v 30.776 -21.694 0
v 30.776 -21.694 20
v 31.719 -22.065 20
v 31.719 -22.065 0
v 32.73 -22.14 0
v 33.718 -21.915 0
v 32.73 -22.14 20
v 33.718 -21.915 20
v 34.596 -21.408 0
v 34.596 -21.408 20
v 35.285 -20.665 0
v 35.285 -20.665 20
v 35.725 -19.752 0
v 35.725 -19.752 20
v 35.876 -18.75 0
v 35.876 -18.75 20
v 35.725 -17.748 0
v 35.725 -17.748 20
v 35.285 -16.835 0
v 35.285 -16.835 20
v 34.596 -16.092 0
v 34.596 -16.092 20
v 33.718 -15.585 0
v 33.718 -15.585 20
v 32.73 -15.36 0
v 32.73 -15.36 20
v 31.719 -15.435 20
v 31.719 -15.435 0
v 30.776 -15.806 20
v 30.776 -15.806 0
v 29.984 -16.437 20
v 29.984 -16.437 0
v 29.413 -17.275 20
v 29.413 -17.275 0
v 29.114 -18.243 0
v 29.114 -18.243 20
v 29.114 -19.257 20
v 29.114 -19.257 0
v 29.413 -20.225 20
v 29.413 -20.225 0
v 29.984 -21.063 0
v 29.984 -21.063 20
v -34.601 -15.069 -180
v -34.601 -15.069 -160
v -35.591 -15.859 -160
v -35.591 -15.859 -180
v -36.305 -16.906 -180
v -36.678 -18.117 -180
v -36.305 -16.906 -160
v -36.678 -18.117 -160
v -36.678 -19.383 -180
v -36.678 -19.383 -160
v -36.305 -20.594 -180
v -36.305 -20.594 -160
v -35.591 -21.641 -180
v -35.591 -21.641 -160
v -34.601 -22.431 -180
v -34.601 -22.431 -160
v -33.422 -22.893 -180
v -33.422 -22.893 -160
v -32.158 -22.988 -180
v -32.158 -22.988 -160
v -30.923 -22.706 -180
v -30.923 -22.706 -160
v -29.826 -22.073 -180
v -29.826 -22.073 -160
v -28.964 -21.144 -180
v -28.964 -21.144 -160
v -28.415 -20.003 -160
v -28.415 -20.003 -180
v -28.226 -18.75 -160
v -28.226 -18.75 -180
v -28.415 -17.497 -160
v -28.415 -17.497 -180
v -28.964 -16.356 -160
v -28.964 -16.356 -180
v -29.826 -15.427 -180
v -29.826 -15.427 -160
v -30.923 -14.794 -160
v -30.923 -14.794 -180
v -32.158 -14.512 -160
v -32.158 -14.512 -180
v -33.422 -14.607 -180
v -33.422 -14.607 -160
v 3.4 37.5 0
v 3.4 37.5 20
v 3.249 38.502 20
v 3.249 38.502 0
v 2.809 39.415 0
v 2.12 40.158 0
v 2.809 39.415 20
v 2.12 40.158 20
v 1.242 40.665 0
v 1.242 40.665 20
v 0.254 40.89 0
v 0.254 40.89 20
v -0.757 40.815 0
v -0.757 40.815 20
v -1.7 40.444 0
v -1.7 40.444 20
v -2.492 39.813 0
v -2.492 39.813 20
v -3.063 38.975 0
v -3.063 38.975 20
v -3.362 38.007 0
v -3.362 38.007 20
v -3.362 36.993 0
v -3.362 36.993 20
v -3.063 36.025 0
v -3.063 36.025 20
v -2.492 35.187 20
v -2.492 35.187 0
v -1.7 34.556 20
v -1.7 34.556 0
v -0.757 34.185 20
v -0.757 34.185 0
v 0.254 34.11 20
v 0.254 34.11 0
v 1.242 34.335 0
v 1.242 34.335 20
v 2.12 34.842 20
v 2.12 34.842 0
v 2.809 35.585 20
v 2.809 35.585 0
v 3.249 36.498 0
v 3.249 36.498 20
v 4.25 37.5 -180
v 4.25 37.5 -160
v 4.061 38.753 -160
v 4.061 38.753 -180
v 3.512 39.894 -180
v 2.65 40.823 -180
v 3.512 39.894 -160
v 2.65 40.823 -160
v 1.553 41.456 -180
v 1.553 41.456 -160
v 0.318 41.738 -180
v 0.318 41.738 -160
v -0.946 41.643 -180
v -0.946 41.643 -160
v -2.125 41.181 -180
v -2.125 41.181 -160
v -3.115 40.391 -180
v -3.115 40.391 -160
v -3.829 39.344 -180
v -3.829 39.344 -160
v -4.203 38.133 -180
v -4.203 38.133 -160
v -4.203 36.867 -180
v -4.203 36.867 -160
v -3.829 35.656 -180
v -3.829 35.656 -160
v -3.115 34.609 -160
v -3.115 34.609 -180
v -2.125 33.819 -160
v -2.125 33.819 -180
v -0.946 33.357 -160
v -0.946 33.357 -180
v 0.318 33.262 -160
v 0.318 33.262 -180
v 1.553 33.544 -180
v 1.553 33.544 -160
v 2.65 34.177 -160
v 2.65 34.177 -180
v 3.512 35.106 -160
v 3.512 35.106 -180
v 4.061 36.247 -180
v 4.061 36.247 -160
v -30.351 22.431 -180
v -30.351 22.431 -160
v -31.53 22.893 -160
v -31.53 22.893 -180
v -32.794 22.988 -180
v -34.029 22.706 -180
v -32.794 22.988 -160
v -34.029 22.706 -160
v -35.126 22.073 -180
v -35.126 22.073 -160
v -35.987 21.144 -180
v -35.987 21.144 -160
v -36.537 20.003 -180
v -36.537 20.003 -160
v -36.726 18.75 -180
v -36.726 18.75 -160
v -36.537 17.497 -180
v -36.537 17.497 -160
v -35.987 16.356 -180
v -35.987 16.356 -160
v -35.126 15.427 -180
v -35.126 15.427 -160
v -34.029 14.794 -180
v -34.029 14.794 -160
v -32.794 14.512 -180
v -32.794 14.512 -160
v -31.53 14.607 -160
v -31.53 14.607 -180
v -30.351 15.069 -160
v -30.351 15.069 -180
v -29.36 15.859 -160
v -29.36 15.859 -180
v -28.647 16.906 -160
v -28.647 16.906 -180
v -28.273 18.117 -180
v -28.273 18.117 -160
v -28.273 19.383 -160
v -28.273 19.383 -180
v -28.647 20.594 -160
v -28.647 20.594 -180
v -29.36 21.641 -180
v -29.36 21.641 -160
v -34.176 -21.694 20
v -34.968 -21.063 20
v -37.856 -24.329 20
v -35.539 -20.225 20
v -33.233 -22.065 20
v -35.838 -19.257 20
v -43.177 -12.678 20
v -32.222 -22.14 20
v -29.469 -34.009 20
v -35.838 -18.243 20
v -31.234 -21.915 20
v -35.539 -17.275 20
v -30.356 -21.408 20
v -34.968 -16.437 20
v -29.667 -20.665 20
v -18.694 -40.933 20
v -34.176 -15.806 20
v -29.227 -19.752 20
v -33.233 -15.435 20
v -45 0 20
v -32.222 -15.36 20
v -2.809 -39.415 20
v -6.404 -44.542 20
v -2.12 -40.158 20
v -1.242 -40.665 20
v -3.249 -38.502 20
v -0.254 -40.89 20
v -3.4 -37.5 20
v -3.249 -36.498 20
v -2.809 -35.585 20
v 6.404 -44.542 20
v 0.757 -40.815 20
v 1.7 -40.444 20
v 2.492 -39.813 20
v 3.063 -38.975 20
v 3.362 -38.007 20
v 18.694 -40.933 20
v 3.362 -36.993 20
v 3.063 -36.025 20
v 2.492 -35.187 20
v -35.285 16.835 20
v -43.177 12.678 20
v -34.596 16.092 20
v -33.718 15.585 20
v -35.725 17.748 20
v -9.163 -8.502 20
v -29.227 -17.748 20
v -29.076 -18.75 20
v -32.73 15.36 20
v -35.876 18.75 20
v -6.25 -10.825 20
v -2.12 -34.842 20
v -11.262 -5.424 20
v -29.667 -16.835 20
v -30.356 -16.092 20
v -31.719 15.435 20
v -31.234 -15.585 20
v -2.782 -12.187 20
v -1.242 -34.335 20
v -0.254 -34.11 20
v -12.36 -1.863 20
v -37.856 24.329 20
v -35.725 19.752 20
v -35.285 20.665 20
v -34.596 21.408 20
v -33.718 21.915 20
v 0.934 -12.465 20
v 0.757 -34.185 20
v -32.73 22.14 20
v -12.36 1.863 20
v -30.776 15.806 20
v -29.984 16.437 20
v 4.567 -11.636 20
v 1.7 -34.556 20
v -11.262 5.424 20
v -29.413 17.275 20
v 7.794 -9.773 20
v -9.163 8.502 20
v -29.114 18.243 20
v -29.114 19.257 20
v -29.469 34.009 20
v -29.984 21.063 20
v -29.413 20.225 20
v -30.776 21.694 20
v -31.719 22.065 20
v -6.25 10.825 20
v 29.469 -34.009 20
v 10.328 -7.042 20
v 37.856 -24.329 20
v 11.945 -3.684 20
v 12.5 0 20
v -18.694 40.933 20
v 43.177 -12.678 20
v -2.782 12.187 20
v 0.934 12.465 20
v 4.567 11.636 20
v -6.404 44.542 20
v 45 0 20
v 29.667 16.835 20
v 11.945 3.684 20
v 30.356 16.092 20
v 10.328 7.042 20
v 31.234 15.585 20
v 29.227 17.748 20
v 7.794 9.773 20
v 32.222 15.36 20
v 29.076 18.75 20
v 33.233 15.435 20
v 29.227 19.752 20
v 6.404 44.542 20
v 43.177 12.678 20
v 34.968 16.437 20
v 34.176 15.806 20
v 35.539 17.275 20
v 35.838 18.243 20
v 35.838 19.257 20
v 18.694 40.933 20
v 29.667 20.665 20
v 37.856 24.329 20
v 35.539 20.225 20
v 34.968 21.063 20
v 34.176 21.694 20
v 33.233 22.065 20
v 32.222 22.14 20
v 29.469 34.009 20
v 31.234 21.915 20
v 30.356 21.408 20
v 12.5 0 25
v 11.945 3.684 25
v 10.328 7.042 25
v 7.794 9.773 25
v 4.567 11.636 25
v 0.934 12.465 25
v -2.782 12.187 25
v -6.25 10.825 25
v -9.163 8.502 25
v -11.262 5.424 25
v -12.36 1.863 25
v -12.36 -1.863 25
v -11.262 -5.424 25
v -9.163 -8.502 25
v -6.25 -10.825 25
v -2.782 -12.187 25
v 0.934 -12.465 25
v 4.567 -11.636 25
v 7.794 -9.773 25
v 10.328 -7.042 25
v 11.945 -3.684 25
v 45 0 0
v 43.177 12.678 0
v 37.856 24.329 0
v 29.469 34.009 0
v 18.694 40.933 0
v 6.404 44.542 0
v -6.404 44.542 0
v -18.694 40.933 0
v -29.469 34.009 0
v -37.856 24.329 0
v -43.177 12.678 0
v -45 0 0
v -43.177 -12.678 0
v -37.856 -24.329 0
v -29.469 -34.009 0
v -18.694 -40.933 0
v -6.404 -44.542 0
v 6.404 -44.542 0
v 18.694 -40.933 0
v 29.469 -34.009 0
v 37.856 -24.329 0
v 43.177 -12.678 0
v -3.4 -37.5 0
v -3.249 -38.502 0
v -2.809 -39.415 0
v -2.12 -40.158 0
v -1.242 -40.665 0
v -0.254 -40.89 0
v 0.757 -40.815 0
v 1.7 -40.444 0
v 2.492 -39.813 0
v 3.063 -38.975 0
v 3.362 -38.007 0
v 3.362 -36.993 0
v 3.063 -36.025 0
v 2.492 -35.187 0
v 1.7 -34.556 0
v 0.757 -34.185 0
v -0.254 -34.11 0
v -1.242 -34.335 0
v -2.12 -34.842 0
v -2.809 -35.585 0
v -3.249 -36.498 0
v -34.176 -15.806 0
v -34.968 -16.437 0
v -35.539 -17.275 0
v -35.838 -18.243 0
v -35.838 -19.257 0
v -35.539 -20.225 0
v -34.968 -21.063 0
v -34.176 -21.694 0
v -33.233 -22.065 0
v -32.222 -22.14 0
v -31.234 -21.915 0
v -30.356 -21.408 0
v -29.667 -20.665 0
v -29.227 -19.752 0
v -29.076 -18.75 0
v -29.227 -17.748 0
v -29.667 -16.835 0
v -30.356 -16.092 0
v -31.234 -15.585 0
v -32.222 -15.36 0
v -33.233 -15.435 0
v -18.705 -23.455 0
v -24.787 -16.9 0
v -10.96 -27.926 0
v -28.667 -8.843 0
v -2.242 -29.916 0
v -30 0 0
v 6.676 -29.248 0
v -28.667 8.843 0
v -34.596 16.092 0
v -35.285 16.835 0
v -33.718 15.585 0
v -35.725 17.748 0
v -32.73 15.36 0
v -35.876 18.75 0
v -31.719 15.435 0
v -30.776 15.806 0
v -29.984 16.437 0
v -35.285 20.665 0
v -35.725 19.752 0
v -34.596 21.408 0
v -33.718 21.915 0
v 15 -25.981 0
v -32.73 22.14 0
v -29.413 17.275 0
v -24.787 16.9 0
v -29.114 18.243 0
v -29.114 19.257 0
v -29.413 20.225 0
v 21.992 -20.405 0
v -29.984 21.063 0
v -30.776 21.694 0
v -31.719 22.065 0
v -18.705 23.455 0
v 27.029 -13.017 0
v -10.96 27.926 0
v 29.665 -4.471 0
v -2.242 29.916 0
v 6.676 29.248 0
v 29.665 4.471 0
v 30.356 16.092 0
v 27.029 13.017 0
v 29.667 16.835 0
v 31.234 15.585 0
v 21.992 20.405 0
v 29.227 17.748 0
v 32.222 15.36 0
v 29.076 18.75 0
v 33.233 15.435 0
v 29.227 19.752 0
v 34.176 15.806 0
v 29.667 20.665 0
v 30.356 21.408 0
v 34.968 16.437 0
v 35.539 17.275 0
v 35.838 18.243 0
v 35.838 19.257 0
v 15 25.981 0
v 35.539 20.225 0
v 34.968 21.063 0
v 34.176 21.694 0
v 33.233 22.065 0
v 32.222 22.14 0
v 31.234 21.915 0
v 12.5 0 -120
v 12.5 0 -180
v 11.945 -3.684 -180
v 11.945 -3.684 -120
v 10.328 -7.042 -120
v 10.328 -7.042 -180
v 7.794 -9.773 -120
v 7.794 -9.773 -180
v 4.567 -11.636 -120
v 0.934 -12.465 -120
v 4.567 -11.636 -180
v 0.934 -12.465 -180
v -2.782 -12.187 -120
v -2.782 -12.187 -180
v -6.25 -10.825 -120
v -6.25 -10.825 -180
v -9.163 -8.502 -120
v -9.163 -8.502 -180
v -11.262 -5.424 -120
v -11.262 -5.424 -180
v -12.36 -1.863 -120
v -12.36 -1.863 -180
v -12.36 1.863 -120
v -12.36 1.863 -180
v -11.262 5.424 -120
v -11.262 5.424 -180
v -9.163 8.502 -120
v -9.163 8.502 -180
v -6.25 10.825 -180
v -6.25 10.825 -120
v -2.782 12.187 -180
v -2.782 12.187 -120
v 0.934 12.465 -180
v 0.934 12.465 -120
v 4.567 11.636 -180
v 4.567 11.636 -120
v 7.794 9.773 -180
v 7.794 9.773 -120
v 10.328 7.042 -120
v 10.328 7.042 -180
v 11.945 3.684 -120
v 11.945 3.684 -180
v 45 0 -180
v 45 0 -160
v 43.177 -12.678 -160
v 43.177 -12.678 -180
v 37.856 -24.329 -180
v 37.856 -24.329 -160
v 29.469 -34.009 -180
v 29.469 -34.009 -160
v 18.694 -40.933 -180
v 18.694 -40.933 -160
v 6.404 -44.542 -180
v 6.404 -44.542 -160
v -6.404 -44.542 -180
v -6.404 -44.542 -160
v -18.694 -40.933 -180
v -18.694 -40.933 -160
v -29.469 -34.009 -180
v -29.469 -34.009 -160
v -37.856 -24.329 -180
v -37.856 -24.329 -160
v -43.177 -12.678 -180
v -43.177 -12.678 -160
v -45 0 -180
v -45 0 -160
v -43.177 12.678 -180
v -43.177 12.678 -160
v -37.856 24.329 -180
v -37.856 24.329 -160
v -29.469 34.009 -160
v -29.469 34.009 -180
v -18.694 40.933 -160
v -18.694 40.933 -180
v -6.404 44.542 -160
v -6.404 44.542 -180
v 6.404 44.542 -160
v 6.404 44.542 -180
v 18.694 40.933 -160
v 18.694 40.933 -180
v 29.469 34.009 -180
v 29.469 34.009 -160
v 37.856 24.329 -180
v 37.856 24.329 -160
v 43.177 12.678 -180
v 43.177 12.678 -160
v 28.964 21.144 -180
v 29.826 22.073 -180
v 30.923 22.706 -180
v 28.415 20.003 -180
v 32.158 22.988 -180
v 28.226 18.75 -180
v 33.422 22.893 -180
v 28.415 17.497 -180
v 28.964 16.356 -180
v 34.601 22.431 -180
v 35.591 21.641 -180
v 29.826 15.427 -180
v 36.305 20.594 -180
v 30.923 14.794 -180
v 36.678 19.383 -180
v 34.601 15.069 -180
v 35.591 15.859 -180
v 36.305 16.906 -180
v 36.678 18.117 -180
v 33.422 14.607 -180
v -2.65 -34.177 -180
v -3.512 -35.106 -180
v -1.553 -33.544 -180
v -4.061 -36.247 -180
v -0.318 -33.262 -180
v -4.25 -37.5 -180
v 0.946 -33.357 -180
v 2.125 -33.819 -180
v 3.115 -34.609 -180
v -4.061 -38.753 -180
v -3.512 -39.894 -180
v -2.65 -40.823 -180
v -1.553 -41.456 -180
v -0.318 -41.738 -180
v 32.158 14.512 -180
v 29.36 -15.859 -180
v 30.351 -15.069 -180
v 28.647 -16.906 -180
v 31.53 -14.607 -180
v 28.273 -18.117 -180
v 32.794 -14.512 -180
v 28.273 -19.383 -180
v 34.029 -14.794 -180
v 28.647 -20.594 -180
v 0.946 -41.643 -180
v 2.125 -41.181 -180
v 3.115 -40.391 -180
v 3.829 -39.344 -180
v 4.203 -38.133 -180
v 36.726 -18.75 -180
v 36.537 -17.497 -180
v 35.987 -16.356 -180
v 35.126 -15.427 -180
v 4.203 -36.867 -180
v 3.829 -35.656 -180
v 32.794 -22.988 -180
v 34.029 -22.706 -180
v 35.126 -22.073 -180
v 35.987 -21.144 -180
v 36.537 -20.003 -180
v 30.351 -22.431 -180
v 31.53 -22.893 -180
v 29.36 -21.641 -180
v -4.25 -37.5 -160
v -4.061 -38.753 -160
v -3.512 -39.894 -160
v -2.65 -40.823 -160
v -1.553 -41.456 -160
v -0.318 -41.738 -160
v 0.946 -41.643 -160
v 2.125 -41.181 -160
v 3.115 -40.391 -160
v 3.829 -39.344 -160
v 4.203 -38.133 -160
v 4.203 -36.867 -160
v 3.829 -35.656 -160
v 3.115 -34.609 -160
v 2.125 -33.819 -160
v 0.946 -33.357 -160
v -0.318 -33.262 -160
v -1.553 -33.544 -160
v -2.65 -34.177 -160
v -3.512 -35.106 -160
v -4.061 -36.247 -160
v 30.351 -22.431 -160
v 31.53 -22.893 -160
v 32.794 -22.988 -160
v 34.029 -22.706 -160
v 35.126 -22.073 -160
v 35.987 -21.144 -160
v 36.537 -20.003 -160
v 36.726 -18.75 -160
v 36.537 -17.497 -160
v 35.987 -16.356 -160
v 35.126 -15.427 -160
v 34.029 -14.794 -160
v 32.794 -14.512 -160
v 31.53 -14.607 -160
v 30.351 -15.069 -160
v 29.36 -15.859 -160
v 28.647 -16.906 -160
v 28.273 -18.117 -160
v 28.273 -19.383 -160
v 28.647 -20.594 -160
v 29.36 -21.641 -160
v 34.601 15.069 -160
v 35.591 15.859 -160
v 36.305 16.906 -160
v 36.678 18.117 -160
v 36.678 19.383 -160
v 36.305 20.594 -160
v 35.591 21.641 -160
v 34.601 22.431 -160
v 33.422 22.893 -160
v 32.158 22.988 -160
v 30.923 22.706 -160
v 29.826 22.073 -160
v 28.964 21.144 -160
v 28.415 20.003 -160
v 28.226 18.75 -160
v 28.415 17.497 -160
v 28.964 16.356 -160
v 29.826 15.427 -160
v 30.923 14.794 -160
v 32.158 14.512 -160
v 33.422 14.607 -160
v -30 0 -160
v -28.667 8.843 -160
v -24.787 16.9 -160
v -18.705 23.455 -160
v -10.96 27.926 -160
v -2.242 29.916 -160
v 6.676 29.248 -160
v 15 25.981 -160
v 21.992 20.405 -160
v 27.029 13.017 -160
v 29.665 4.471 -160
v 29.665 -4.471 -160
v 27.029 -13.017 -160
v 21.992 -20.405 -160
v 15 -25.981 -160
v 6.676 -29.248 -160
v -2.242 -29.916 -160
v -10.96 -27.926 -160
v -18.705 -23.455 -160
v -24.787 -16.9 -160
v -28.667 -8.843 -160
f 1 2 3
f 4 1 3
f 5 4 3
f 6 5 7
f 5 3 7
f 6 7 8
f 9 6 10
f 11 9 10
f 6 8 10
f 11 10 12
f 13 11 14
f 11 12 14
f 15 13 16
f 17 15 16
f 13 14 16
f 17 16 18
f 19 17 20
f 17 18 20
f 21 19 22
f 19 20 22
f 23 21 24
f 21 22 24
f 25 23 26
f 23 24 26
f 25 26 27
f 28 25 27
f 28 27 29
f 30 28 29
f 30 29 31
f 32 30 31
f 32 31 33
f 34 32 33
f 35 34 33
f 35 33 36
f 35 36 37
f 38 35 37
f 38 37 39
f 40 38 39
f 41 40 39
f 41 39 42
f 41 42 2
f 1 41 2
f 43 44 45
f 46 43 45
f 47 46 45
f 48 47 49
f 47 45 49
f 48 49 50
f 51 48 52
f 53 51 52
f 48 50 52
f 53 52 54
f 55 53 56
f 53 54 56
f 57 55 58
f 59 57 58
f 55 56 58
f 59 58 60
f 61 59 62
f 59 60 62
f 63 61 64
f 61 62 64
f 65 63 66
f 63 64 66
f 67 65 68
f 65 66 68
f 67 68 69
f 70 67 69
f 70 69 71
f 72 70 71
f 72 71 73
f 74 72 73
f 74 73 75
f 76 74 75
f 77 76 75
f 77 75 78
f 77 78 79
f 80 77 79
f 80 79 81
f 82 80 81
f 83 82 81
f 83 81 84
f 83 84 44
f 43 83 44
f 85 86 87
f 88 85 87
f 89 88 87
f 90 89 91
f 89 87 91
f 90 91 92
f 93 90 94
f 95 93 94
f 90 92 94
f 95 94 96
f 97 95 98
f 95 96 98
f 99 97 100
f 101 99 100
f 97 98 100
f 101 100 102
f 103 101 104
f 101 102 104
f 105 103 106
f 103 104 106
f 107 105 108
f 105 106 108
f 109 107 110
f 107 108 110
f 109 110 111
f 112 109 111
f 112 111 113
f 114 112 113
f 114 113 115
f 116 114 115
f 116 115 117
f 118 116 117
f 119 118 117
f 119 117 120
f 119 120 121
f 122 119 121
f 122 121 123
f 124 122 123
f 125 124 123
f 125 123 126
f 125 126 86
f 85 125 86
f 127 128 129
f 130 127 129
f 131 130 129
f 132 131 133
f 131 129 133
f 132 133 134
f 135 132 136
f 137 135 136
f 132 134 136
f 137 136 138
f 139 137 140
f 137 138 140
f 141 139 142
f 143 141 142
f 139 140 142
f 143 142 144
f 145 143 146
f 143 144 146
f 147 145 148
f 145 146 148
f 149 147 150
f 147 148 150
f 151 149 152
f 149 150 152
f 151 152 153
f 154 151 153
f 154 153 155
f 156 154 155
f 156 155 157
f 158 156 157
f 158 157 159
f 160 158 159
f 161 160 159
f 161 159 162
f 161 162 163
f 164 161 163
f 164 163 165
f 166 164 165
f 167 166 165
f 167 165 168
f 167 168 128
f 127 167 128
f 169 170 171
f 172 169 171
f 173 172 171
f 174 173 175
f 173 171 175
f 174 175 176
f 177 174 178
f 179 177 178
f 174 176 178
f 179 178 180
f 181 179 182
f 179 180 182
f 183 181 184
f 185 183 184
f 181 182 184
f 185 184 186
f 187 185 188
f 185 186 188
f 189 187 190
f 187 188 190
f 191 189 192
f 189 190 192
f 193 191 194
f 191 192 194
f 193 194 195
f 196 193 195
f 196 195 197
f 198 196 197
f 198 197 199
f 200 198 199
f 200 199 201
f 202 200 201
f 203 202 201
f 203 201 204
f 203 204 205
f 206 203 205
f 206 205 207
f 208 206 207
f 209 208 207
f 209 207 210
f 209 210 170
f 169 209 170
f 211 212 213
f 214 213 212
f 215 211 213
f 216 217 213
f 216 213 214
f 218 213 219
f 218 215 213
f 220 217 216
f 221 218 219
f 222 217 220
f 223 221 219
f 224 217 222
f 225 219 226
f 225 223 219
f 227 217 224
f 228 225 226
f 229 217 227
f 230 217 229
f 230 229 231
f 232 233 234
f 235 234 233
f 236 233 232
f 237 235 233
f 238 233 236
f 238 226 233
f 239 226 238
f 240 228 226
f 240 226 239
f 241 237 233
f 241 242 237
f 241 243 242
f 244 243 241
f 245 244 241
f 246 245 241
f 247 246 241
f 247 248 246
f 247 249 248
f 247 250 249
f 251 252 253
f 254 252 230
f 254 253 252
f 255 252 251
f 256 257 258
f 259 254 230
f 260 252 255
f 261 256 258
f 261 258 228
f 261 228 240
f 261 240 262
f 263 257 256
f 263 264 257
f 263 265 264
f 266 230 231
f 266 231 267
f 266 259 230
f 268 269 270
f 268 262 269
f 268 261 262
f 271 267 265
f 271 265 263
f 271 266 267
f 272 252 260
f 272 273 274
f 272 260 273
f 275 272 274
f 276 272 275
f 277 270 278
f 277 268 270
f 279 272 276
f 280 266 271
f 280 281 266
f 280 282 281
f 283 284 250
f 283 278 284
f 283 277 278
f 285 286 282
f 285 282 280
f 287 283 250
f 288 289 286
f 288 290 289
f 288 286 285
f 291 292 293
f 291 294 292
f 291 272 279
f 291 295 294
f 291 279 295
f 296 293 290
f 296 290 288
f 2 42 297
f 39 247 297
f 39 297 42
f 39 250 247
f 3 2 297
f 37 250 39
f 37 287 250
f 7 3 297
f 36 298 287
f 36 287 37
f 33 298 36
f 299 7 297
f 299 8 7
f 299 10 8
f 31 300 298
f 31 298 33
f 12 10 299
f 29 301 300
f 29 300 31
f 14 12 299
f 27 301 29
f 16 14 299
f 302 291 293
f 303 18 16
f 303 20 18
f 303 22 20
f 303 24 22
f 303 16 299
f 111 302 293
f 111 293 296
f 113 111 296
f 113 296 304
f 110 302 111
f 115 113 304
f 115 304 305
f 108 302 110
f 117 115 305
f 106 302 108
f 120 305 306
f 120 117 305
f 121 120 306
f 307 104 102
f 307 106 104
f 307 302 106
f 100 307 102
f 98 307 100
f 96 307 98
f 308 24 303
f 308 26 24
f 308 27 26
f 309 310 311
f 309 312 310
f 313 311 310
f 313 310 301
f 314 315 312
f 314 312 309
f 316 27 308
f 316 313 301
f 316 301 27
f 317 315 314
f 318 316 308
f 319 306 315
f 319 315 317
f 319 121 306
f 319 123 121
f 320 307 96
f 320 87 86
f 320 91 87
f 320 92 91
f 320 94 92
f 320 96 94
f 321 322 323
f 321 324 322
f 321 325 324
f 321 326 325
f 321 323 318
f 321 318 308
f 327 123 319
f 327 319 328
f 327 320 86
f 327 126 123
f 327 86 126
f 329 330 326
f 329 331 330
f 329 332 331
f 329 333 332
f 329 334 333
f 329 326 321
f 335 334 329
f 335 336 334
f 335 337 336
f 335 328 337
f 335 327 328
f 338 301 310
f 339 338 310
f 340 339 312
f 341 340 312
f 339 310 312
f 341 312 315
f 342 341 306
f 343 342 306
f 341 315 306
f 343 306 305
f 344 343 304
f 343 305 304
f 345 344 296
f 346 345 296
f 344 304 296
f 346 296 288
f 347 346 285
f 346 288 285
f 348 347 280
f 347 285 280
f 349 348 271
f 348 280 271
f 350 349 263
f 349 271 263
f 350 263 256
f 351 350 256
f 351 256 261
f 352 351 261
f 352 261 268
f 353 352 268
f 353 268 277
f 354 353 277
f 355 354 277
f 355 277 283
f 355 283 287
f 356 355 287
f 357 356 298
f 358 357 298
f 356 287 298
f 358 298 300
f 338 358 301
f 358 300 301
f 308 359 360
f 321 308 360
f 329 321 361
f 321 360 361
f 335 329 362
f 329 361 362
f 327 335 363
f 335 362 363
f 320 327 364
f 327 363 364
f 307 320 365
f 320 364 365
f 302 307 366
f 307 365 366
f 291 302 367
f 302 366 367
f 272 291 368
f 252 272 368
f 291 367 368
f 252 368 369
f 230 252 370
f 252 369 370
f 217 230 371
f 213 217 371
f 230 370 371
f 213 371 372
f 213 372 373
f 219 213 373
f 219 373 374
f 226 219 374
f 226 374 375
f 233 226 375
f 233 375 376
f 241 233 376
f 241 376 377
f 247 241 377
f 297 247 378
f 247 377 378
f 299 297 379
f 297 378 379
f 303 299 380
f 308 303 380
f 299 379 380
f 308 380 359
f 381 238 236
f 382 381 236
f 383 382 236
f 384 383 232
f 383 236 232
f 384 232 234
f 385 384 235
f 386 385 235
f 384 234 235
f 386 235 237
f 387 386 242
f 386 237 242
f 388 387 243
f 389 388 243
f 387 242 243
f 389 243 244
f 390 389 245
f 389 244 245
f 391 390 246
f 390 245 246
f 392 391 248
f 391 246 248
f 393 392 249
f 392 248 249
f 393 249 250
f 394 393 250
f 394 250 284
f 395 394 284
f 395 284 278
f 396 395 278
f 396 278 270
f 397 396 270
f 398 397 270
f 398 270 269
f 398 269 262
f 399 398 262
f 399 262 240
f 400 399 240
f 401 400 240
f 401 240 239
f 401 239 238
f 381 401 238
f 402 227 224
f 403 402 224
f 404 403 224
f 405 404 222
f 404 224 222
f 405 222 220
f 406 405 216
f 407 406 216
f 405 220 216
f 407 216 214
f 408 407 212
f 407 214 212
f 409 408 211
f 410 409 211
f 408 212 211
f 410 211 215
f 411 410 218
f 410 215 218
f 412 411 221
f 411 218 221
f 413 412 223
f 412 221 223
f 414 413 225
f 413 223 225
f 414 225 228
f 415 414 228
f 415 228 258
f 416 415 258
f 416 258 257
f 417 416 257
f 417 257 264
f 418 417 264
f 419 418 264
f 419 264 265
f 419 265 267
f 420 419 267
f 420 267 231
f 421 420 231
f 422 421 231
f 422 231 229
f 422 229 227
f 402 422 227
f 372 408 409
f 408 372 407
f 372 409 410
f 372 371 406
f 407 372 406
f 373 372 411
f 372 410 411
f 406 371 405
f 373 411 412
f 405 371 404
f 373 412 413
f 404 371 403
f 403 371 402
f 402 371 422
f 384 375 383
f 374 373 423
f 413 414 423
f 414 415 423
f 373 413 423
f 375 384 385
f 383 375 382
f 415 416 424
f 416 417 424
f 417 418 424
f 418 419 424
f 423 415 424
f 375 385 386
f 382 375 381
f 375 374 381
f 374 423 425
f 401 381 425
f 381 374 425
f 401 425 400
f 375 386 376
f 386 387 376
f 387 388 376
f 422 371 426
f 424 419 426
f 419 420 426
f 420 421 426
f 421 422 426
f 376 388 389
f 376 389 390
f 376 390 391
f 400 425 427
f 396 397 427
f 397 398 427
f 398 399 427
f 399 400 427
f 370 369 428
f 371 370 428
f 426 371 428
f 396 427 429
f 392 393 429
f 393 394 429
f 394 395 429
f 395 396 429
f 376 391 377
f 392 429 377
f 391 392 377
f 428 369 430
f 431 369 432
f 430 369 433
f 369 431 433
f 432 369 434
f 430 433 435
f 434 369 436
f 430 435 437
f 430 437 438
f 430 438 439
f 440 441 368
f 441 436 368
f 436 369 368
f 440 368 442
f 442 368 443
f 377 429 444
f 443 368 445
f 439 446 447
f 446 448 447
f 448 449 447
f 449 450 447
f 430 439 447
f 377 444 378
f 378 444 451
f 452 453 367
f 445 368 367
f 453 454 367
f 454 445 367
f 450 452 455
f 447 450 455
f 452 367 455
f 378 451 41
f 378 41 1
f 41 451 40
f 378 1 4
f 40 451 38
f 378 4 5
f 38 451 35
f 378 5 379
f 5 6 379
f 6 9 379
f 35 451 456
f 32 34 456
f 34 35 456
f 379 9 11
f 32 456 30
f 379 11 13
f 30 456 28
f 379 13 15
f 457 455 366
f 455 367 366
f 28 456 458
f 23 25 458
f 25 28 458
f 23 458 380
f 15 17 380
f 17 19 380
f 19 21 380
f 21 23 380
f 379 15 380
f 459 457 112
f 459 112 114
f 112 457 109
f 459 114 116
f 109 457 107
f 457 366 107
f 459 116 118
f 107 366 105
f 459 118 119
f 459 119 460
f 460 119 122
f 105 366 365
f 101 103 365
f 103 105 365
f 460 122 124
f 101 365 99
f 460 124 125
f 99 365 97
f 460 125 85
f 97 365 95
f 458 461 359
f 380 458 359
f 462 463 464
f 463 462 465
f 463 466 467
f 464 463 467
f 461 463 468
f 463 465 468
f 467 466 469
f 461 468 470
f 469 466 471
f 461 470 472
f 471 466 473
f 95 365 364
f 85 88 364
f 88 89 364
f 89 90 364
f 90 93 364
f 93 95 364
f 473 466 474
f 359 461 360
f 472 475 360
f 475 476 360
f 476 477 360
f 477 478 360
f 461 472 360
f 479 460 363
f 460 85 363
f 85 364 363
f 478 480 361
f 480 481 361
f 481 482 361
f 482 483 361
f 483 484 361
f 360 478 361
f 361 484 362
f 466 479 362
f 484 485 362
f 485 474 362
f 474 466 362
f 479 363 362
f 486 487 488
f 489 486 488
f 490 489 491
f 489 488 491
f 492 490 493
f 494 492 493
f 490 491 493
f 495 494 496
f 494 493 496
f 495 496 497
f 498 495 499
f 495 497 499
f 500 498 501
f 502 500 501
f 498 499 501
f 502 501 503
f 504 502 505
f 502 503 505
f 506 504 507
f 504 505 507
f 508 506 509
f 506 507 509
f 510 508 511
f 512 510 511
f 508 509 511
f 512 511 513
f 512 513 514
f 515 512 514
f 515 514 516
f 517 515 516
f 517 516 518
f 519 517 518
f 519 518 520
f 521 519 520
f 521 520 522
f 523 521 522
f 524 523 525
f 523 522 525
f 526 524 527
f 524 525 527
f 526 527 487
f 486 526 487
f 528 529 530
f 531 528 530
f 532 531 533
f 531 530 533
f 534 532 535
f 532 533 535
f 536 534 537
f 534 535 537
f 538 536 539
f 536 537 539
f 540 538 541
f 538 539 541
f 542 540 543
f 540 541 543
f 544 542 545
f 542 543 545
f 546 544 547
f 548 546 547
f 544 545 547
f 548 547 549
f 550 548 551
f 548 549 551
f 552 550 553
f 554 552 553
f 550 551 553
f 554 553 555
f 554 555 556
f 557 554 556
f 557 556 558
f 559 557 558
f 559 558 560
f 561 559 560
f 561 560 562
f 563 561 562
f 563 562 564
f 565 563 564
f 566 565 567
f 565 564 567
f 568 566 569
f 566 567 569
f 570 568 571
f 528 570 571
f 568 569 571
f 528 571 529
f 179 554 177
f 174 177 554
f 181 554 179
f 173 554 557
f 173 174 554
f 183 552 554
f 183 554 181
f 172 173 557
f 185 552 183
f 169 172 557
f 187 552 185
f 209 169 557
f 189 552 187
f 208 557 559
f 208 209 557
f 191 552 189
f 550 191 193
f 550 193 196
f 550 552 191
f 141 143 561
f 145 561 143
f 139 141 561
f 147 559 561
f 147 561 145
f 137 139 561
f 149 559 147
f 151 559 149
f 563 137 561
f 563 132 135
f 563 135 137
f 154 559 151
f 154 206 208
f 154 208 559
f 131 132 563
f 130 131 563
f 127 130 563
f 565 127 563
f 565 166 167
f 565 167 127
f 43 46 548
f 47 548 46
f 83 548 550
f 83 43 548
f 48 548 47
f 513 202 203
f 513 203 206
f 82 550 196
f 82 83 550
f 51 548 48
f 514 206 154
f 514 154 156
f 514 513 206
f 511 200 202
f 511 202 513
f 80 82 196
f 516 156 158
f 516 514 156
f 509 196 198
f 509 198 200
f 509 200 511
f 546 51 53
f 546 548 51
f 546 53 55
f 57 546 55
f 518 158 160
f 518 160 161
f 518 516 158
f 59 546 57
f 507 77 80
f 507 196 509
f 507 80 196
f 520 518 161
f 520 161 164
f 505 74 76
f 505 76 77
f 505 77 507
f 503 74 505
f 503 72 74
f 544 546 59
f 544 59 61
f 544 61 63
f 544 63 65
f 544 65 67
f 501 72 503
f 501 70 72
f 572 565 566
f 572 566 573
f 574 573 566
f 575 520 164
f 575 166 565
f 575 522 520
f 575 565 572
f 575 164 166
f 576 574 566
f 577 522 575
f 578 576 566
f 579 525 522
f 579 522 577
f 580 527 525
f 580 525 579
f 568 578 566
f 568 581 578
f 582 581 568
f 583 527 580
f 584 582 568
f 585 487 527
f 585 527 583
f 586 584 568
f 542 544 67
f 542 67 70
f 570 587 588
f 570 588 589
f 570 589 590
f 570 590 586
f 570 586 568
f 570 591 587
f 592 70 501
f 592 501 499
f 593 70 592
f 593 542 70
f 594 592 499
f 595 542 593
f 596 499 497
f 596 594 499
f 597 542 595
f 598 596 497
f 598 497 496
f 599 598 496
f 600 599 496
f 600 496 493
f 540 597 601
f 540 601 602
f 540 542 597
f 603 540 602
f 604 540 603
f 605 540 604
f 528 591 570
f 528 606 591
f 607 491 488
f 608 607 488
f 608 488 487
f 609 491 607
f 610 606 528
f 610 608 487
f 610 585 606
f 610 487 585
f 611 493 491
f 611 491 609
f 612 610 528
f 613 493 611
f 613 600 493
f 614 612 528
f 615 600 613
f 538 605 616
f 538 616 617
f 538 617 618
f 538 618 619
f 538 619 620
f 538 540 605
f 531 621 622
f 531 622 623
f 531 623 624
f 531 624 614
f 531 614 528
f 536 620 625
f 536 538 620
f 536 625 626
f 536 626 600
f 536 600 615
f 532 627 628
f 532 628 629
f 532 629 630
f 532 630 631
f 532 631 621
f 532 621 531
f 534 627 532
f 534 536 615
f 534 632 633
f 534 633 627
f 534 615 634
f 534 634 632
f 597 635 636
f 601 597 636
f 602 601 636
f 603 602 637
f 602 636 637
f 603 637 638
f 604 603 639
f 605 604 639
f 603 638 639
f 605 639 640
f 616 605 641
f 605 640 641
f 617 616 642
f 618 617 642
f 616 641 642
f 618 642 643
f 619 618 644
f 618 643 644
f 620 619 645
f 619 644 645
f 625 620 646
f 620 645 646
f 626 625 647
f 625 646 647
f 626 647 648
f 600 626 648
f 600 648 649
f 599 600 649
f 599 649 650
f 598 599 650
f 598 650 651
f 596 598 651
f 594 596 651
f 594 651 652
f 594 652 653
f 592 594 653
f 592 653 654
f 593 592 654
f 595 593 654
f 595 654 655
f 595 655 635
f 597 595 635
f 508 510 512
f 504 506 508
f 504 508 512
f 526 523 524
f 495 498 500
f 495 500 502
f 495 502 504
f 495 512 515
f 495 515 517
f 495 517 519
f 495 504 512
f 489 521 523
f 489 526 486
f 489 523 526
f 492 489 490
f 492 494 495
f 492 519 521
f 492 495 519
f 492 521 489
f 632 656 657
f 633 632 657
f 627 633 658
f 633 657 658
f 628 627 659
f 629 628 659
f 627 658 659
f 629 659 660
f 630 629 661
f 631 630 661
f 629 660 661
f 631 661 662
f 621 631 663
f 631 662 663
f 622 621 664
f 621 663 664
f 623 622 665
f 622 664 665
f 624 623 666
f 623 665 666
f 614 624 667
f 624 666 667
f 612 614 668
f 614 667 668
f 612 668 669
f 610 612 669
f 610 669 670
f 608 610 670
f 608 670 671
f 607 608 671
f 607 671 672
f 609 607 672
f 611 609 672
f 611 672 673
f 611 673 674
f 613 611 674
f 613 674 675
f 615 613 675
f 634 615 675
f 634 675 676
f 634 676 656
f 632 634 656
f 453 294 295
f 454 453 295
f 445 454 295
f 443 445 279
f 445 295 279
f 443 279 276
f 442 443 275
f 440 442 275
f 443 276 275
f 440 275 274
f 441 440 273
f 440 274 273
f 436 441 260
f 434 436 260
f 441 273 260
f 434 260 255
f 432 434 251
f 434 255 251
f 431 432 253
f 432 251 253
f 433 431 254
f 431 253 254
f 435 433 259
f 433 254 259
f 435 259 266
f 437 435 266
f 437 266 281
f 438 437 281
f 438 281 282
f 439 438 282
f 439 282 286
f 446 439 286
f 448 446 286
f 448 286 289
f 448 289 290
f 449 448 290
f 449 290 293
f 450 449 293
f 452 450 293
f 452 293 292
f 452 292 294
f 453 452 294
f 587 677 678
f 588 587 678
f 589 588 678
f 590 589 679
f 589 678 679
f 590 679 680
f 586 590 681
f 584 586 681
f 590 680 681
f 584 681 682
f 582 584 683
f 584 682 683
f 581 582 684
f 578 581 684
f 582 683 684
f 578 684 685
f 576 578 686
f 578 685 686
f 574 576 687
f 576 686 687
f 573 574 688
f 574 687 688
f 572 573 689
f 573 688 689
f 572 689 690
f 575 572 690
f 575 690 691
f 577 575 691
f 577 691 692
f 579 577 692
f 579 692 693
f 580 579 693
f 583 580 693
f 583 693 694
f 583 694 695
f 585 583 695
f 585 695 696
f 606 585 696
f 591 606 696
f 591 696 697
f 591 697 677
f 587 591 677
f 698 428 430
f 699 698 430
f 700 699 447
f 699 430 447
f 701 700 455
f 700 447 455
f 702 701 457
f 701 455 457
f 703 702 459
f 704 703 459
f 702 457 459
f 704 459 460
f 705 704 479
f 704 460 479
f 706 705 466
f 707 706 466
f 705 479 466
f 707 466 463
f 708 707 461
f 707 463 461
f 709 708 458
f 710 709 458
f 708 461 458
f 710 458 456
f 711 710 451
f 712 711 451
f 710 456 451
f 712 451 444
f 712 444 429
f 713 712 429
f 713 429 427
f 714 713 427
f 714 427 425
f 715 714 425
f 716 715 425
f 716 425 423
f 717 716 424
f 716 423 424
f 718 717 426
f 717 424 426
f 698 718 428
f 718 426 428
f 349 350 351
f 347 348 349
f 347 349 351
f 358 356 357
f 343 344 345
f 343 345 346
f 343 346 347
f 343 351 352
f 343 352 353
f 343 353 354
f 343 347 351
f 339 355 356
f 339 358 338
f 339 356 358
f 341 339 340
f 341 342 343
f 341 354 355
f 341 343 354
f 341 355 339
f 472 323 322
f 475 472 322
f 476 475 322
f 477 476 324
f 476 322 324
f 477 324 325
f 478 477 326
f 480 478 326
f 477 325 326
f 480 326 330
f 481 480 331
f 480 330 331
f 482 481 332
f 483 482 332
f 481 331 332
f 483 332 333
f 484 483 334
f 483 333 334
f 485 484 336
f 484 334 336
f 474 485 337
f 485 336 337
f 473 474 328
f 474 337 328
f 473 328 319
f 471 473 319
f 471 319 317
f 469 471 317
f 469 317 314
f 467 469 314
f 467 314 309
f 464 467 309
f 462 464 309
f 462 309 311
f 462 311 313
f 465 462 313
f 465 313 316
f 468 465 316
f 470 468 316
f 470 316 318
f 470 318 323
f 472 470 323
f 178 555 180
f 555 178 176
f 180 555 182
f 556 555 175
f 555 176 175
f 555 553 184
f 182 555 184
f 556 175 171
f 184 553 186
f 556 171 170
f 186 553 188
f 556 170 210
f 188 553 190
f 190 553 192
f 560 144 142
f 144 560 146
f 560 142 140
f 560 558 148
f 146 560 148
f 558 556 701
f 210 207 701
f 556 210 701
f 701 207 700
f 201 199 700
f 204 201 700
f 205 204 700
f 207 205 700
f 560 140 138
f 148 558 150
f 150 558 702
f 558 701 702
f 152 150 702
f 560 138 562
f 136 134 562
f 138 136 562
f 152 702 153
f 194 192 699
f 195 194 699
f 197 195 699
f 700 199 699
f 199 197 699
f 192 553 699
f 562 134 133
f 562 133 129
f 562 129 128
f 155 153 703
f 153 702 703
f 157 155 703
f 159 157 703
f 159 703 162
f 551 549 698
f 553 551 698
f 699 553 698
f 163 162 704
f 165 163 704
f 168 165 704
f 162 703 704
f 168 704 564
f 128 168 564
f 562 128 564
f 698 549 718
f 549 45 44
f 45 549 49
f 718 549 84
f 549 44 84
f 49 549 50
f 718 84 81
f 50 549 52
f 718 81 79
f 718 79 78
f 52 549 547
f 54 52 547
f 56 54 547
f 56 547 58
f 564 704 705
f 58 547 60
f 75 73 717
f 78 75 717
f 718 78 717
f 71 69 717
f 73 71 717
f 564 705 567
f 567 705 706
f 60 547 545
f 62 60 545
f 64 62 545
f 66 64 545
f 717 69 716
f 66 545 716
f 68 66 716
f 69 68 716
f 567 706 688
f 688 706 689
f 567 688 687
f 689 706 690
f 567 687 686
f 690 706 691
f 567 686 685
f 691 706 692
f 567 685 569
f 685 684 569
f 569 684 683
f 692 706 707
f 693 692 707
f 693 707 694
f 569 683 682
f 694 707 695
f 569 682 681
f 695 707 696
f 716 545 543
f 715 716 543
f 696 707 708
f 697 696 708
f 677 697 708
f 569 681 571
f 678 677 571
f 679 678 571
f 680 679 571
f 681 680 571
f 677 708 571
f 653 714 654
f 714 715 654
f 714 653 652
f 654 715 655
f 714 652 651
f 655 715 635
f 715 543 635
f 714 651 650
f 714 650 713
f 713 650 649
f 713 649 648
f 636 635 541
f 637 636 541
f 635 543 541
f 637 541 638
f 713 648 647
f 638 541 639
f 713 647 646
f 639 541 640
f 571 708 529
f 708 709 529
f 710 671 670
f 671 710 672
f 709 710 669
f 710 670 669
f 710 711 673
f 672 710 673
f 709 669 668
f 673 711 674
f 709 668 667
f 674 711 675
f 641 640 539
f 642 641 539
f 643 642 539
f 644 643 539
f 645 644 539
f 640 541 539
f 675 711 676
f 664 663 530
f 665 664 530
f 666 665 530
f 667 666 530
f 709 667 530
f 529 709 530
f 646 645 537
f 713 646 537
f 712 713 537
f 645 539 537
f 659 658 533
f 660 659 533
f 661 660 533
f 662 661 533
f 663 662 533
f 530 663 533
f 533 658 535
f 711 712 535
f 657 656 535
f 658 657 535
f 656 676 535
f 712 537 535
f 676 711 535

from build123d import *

# Parameters (mm, degrees)
SKETCH1_R                      = 45
BOSS_EXTRUDE1_DEPTH            = 20
SKETCH2_R                      = 30
BOSS_EXTRUDE2_DEPTH            = 160
SKETCH3_R                      = 45
BOSS_EXTRUDE3_DEPTH            = 20
SKETCH4_R                      = 12.5
BOSS_EXTRUDE4_DEPTH            = 5
M8X1_25_TAPPED_HOLE1_REACH     = 202
M8X1_25_TAPPED_HOLE1_BORE_R    = 3.4
CIRPATTERN1_COUNT              = 6
F_8_5_8_5_DIAMETER_HOLE1_D     = 8.5
F_8_5_8_5_DIAMETER_HOLE1_DEPTH = 20.001
CIRPATTERN2_COUNT              = 6
SKETCH11_R                     = 12.5
CUT_EXTRUDE1_DEPTH             = 60


with BuildPart() as part:
    # Sketch1 → Boss-Extrude1 (new body)
    with BuildSketch(Plane.XY):
        Circle(SKETCH1_R)
    extrude(amount=BOSS_EXTRUDE1_DEPTH)

    # Sketch2 → Boss-Extrude2 (add)
    with BuildSketch(Plane(origin=(0, 0, 0), x_dir=(-1, 0, 0), z_dir=(0, 0, -1))):
        Circle(SKETCH2_R)
    extrude(amount=BOSS_EXTRUDE2_DEPTH)

    # Sketch3 → Boss-Extrude3 (add)
    with BuildSketch(Plane(origin=(0, 0, -160), x_dir=(-1, 0, 0), z_dir=(0, 0, -1))):
        with Locations(Location((0, 0, 0), (0, 0, 180))):  # turned: the seam where the file's is
            Circle(SKETCH3_R)
    extrude(amount=BOSS_EXTRUDE3_DEPTH)

    # Sketch4 → Boss-Extrude4 (add)
    with BuildSketch(Plane.XY.offset(20)):
        Circle(SKETCH4_R)
    extrude(amount=BOSS_EXTRUDE4_DEPTH)

    # M8x1.25 Tapped Hole1 bore → M8x1.25 Tapped Hole1 (cut, up to next)
    with BuildSketch(Plane.XY.offset(20), mode=Mode.PRIVATE) as m8x1_25_tapped_hole1_sk1:
        with Locations((0, 37.5)):
            Circle(M8X1_25_TAPPED_HOLE1_BORE_R)
    m8x1_25_tapped_hole1_tool1 = extrude(m8x1_25_tapped_hole1_sk1.sketch, amount=-M8X1_25_TAPPED_HOLE1_REACH, mode=Mode.PRIVATE) & part.part
    m8x1_25_tapped_hole1 = m8x1_25_tapped_hole1_tool1.solids().sort_by_distance((0, 37.5, 20))[0]
    add(m8x1_25_tapped_hole1, mode=Mode.SUBTRACT)

    # CirPattern1: M8x1.25 Tapped Hole1 ×6 about axis
    cirpattern1_axis = Axis((0, 0, 0), (0, 0, 1))
    for i in range(1, CIRPATTERN1_COUNT):
        add(m8x1_25_tapped_hole1.rotate(cirpattern1_axis, i * 360 / CIRPATTERN1_COUNT), mode=Mode.SUBTRACT)

    # Ø8.5 (8.5) Diameter Hole1
    with Locations(Plane(origin=(0, 0, -180), x_dir=(-1, 0, 0), z_dir=(0, 0, -1))):
        with Locations((0, 37.5)):
            f_8_5_8_5_diameter_hole1 = Hole(F_8_5_8_5_DIAMETER_HOLE1_D / 2, depth=F_8_5_8_5_DIAMETER_HOLE1_DEPTH)

    # CirPattern2: Ø8.5 (8.5) Diameter Hole1 ×6 about axis
    cirpattern2_axis = Axis((0, 0, 0), (0, 0, 1))
    for i in range(1, CIRPATTERN2_COUNT):
        add(f_8_5_8_5_diameter_hole1.rotate(cirpattern2_axis, i * 360 / CIRPATTERN2_COUNT), mode=Mode.SUBTRACT)

    # Sketch11 → Cut-Extrude1 (cut)
    with BuildSketch(Plane(origin=(0, 0, -180), x_dir=(-1, 0, 0), z_dir=(0, 0, -1))):
        with Locations(Location((0, 0, 0), (0, 0, 180))):  # turned: the seam where the file's is
            Circle(SKETCH11_R)
    extrude(amount=-CUT_EXTRUDE1_DEPTH, mode=Mode.SUBTRACT)


solid = part.part
